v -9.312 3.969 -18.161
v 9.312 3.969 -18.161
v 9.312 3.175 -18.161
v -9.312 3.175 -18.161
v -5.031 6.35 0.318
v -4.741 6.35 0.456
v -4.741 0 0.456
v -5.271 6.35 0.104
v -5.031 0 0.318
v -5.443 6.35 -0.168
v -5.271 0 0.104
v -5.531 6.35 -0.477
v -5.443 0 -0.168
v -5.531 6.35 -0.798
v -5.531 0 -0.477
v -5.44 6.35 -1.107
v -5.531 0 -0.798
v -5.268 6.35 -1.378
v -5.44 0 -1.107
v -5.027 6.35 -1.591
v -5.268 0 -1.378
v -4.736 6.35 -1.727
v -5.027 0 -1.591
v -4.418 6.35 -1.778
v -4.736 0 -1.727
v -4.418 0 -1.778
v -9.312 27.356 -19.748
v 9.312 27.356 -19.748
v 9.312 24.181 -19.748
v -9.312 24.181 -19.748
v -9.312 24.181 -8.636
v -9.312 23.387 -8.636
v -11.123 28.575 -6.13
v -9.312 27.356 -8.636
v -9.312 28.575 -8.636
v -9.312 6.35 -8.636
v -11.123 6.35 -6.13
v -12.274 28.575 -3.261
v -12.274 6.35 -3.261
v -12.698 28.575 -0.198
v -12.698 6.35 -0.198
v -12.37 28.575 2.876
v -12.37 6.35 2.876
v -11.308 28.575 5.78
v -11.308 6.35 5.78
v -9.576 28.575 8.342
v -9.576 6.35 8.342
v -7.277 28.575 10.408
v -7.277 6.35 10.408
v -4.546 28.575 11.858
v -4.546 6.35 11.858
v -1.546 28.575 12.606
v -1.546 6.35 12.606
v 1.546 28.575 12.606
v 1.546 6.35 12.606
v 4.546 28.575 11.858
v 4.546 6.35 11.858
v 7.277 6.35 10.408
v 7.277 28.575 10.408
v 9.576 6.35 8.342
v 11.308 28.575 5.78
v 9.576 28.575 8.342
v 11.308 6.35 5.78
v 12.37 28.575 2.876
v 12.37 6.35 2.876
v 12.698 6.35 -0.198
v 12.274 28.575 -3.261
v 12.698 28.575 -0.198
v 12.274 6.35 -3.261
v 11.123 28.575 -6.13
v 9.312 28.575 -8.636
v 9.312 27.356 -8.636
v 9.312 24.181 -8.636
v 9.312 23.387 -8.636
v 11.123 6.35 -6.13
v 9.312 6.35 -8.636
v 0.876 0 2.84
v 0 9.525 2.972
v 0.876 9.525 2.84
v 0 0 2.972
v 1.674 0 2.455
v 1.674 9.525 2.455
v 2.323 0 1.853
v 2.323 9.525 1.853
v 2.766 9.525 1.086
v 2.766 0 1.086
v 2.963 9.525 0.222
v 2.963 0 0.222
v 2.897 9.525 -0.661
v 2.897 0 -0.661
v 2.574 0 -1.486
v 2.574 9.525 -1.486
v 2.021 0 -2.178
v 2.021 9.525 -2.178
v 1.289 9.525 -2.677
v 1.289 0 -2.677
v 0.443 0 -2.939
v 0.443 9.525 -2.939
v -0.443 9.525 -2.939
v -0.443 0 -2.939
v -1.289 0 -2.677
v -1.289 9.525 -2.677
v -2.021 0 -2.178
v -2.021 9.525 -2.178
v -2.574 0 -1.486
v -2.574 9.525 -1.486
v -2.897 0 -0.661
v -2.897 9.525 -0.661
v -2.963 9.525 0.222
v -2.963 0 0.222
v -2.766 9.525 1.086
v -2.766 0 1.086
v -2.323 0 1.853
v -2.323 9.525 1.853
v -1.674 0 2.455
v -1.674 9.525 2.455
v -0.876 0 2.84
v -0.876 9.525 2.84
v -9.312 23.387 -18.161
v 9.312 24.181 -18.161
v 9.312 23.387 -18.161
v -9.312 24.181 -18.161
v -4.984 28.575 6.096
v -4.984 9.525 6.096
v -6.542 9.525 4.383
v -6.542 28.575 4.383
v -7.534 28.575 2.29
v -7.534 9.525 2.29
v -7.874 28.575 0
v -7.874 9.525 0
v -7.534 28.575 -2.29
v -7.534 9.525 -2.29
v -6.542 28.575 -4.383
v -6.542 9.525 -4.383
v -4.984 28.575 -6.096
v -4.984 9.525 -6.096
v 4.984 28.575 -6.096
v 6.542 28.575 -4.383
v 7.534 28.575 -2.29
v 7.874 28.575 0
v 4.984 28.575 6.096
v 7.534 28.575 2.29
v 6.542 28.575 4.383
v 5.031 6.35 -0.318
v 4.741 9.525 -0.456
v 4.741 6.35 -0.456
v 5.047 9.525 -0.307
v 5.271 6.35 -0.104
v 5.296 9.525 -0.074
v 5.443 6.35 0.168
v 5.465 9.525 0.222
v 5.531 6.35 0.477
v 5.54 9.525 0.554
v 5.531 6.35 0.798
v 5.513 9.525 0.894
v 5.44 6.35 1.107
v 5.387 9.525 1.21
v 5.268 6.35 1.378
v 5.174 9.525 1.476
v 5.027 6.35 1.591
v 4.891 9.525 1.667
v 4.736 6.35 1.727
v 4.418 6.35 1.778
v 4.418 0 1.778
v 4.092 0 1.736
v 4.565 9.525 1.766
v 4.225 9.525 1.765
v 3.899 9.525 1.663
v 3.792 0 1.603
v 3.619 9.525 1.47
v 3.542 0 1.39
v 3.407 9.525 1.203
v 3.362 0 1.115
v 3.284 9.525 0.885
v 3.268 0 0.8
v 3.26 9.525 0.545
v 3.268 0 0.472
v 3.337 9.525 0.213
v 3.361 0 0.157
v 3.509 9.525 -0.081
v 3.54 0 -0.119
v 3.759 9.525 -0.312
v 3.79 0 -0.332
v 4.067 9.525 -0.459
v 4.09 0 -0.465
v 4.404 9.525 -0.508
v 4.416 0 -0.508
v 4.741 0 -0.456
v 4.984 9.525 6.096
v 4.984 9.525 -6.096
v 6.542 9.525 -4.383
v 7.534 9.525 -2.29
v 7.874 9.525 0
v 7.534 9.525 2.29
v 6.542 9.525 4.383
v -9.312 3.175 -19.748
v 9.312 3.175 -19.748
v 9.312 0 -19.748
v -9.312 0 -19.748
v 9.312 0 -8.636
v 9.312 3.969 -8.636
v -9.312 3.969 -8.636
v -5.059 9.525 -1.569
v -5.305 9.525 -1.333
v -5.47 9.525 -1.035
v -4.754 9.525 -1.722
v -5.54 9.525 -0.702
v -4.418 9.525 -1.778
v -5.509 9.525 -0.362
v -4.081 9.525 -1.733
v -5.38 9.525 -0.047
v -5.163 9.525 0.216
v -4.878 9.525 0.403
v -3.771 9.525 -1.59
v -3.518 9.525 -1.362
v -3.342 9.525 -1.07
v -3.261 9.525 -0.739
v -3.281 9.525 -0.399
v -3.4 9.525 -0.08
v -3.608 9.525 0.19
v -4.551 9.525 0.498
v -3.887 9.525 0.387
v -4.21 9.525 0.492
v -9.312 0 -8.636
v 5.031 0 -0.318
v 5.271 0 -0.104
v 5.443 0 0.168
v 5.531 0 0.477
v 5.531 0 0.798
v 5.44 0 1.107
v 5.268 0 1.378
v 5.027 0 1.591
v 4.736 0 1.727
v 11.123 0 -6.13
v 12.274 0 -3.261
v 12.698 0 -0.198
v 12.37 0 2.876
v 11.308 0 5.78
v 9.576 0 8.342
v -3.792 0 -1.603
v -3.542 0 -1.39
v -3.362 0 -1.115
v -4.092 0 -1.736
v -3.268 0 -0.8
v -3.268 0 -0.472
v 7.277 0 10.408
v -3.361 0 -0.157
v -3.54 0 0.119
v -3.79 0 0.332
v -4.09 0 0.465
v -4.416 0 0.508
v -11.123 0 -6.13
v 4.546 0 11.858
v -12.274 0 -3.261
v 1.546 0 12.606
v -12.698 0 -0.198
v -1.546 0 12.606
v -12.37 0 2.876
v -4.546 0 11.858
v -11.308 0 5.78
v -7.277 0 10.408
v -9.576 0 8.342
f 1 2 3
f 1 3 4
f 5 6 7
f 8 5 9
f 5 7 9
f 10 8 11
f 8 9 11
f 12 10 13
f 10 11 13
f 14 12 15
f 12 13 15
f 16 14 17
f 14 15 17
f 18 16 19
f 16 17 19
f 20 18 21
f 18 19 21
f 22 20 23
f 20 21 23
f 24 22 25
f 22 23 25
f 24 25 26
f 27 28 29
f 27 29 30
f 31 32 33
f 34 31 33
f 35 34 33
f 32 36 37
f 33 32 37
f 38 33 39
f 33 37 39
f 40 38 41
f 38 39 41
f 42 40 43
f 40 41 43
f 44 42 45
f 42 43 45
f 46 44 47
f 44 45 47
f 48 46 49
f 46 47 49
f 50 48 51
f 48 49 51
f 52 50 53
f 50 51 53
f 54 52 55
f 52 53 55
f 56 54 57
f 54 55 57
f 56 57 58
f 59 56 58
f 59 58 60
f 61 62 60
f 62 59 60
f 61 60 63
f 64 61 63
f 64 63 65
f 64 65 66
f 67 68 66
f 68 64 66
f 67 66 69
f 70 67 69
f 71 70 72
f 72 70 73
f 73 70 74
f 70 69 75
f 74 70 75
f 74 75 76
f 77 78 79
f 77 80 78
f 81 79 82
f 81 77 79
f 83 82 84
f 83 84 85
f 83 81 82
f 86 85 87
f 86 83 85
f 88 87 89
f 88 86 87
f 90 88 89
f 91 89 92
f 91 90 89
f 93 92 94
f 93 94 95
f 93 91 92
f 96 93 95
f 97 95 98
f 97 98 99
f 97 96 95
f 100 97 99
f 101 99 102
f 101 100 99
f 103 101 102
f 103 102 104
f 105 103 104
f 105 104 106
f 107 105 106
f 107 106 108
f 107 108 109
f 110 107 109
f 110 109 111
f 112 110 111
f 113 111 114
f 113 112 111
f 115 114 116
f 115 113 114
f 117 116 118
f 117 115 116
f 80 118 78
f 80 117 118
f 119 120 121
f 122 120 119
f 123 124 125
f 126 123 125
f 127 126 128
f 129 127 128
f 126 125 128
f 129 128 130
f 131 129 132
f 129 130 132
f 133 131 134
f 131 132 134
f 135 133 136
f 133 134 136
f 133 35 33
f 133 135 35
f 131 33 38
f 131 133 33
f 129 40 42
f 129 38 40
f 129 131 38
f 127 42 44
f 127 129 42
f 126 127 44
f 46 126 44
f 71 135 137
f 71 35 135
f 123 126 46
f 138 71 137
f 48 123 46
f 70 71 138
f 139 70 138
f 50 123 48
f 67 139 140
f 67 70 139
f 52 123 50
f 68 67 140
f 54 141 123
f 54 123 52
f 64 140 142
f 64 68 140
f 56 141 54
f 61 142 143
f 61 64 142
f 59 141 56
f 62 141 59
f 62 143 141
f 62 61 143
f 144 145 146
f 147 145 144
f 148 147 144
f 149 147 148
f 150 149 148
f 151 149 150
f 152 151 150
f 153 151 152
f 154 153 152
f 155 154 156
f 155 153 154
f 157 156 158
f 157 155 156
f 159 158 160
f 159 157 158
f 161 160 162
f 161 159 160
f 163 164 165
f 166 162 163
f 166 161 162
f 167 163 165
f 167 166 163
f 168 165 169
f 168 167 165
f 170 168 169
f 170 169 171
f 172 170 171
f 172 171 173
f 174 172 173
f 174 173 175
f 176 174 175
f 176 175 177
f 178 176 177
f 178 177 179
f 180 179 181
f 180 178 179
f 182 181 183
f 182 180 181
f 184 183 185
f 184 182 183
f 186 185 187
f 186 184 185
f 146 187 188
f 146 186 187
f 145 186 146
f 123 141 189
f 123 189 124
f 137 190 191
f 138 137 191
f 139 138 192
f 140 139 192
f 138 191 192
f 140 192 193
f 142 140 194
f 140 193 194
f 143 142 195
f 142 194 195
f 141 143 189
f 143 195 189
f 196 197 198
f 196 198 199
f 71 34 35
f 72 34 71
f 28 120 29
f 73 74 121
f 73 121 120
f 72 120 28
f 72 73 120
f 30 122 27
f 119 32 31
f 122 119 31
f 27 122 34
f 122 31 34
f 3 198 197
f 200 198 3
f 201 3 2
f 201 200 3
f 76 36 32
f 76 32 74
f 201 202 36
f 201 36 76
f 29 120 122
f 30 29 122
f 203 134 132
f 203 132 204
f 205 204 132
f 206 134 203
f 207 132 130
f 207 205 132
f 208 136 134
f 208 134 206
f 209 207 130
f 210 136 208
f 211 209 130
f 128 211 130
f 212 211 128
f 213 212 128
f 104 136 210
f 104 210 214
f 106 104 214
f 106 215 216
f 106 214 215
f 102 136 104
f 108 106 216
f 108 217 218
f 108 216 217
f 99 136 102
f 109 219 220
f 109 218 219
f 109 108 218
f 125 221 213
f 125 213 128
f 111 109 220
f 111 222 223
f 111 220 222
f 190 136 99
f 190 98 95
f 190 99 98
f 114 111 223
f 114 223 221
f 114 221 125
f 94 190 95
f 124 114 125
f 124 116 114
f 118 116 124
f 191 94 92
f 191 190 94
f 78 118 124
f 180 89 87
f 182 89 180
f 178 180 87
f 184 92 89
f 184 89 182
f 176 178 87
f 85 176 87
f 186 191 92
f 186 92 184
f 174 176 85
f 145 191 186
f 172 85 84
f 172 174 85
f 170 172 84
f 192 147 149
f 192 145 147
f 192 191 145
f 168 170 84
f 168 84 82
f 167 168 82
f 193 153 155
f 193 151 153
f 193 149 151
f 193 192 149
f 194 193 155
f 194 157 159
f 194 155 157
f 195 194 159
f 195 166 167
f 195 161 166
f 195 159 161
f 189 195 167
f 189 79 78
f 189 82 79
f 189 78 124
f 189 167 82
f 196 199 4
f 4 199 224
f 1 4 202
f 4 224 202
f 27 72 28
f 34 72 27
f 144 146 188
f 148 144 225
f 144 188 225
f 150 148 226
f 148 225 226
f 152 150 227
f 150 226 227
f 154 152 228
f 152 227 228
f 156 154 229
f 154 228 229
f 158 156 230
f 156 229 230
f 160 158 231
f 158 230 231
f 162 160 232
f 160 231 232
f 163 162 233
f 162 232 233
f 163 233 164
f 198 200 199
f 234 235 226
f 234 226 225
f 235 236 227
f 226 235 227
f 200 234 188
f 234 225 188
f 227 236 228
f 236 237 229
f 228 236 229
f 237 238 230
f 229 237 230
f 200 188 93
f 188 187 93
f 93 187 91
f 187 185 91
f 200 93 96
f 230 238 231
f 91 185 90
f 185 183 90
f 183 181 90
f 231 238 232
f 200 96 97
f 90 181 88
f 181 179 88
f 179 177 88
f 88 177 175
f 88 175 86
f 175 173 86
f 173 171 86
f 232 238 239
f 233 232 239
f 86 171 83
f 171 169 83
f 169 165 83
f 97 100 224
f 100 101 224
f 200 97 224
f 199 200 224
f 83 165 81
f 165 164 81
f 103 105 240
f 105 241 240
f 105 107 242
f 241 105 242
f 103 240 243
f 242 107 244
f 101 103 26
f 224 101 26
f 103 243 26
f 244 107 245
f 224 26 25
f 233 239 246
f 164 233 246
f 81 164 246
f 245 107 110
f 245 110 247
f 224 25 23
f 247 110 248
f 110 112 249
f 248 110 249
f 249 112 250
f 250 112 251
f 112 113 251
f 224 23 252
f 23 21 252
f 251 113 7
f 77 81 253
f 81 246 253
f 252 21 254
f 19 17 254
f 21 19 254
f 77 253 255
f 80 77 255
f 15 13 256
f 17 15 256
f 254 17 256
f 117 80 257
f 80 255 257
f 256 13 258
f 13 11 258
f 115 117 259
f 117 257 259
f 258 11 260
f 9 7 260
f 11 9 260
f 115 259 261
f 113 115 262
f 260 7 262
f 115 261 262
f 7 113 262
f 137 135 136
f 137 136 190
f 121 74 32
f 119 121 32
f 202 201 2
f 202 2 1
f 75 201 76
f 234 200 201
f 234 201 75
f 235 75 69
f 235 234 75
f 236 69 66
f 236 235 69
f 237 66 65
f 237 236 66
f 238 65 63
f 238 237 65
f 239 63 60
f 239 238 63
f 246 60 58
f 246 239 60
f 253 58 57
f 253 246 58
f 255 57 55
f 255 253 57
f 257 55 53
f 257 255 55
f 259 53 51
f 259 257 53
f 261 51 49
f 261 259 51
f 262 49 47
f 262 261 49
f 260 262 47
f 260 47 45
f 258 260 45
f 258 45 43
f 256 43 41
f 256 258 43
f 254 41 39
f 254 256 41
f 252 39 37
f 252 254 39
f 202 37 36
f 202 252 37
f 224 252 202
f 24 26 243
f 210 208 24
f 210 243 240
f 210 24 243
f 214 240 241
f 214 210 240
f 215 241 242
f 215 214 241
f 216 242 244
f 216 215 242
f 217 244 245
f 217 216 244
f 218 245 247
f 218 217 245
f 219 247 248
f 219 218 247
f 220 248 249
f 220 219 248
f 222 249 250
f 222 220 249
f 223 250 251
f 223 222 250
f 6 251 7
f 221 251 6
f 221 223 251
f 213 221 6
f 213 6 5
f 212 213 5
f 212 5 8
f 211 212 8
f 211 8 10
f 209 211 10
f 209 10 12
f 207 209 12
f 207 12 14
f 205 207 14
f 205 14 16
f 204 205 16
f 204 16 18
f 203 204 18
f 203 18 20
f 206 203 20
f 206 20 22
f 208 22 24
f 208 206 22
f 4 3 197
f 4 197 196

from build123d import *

# Parameters (mm, degrees)
SKETCH1_R               = 4.7625
SKETCH1_R_2             = 2.9718
BOSS_EXTRUDE1_DEPTH     = 6.35
SKETCH2_R               = 12.7
SKETCH2_R_2             = 2.9718
BOSS_EXTRUDE3_DEPTH     = 3.175
SKETCH3_R               = 12.7
BOSS_EXTRUDE4_DEPTH     = 19.05
CUT_EXTRUDE1_DEPTH      = 29.575
CUT_EXTRUDE1_DEPTH_BACK = 29.575
SKETCH4_R               = 1.143
SKETCH5_W               = 25.4
SKETCH5_H               = 28.575
CUT_EXTRUDE2_DEPTH      = 38.855587712
BOSS_EXTRUDE6_START     = 6.35
BOSS_EXTRUDE6_DEPTH     = 6.35
SKETCH8_W               = 18.623587624
SKETCH8_H               = 3.175
BOSS_EXTRUDE7_DEPTH     = 11.1125
SKETCH9_W               = 18.623587624
SKETCH9_H               = 0.79375
BOSS_EXTRUDE8_DEPTH     = 9.525


with BuildPart() as part:
    # Sketch1 → Boss-Extrude1 (new body)
    with BuildSketch(Plane(origin=(0, 0, 0), x_dir=(1, 0, 0), z_dir=(0, 1, 0))):
        with Locations(Location((0, 0, 0), (0, 0, 270))):
            Circle(SKETCH1_R)
        with Locations(Location((0, 0, 0), (0, 0, 270))):
            Circle(SKETCH1_R_2, mode=Mode.SUBTRACT)
    extrude(amount=BOSS_EXTRUDE1_DEPTH)

    # Sketch2 → Boss-Extrude3 (add)
    with BuildSketch(Plane(origin=(0, 6.35, 0), x_dir=(1, 0, 0), z_dir=(0, 1, 0))):
        with Locations(Location((0, 0, 0), (0, 0, 270))):
            Circle(SKETCH2_R)
        with Locations(Location((0, 0, 0), (0, 0, 270))):
            Circle(SKETCH2_R_2, mode=Mode.SUBTRACT)
    extrude(amount=BOSS_EXTRUDE3_DEPTH)

    # Sketch3 → Boss-Extrude4 (add)
    with BuildSketch(Plane(origin=(0, 9.525, 0), x_dir=(1, 0, 0), z_dir=(0, 1, 0))):
        with Locations(Location((0, 0, 0), (0, 0, 270))):
            Circle(SKETCH3_R)
        with BuildLine():
            Line((-4.983839885, 6.096), (4.983839885, 6.096))
            ThreePointArc((4.983839885, 6.096), (7.874, 0), (4.983839885, -6.096))
            Line((4.983839885, -6.096), (-4.983839885, -6.096))
            ThreePointArc((-4.983839885, -6.096), (-7.874, 0), (-4.983839885, 6.096))
        make_face(mode=Mode.SUBTRACT)
    extrude(amount=BOSS_EXTRUDE4_DEPTH)

    # Sketch4 → Cut-Extrude1 (cut, two sides: drawn at the far end of the back side and taken through both)
    with BuildSketch(Plane.XZ.offset(-6.35).offset(-CUT_EXTRUDE1_DEPTH_BACK)):
        with Locations(Location((-4.399409051, -0.635, 0), (0, 0, 269.056983799))):
            Circle(SKETCH4_R)
        with Locations(Location((4.399409051, 0.635, 0), (0, 0, 287.369437604))):
            Circle(SKETCH4_R)
    extrude(amount=CUT_EXTRUDE1_DEPTH + CUT_EXTRUDE1_DEPTH_BACK, mode=Mode.SUBTRACT)

    # Sketch5 → Cut-Extrude2 (cut, through all)
    with BuildSketch(Plane.XY.offset(-8.636)):
        with Locations((0, 14.2875)):
            Rectangle(SKETCH5_W, SKETCH5_H)
    extrude(amount=-CUT_EXTRUDE2_DEPTH, mode=Mode.SUBTRACT)

    # Sketch7 → Boss-Extrude6 (add)
    with BuildSketch(Plane.XZ.offset(-6.35).offset(BOSS_EXTRUDE6_START)):
        with BuildLine():
            Line((-9.311793812, -8.636), (9.311793812, -8.636))
            ThreePointArc((9.311793812, -8.636), (0, 12.7), (-9.311793812, -8.636))
        make_face()
        with BuildLine():
            ThreePointArc((-4.740630835, 0.455878863), (-5.530685664, -0.798285714), (-4.418220539, -1.77784519))
            ThreePointArc((-4.418220539, -1.77784519), (0.680357143, -4.713652555), (4.740630835, -0.455878863))
            ThreePointArc((4.740630835, -0.455878863), (5.530685664, 0.798285714), (4.418220539, 1.77784519))
            ThreePointArc((4.418220539, 1.77784519), (-0.680357143, 4.713652555), (-4.740630835, 0.455878863))
        make_face(mode=Mode.SUBTRACT)
    extrude(amount=-BOSS_EXTRUDE6_DEPTH)

    # Sketch8 → Boss-Extrude7 (add)
    with BuildSketch(Plane(origin=(0, 0, -8.636), x_dir=(-1, 0, 0), z_dir=(0, 0, -1))):
        with Locations((0, 1.5875)):
            Rectangle(SKETCH8_W, SKETCH8_H)
        with Locations((0, 25.7683)):
            Rectangle(SKETCH8_W, SKETCH8_H)
    extrude(amount=BOSS_EXTRUDE7_DEPTH)

    # Sketch9 → Boss-Extrude8 (add)
    with BuildSketch(Plane(origin=(0, 0, -8.636), x_dir=(-1, 0, 0), z_dir=(0, 0, -1))):
        with Locations((0, 3.571875)):
            Rectangle(SKETCH9_W, SKETCH9_H)
        with Locations((0, 23.783925)):
            Rectangle(SKETCH9_W, SKETCH9_H)
    extrude(amount=BOSS_EXTRUDE8_DEPTH)


solid = part.part
